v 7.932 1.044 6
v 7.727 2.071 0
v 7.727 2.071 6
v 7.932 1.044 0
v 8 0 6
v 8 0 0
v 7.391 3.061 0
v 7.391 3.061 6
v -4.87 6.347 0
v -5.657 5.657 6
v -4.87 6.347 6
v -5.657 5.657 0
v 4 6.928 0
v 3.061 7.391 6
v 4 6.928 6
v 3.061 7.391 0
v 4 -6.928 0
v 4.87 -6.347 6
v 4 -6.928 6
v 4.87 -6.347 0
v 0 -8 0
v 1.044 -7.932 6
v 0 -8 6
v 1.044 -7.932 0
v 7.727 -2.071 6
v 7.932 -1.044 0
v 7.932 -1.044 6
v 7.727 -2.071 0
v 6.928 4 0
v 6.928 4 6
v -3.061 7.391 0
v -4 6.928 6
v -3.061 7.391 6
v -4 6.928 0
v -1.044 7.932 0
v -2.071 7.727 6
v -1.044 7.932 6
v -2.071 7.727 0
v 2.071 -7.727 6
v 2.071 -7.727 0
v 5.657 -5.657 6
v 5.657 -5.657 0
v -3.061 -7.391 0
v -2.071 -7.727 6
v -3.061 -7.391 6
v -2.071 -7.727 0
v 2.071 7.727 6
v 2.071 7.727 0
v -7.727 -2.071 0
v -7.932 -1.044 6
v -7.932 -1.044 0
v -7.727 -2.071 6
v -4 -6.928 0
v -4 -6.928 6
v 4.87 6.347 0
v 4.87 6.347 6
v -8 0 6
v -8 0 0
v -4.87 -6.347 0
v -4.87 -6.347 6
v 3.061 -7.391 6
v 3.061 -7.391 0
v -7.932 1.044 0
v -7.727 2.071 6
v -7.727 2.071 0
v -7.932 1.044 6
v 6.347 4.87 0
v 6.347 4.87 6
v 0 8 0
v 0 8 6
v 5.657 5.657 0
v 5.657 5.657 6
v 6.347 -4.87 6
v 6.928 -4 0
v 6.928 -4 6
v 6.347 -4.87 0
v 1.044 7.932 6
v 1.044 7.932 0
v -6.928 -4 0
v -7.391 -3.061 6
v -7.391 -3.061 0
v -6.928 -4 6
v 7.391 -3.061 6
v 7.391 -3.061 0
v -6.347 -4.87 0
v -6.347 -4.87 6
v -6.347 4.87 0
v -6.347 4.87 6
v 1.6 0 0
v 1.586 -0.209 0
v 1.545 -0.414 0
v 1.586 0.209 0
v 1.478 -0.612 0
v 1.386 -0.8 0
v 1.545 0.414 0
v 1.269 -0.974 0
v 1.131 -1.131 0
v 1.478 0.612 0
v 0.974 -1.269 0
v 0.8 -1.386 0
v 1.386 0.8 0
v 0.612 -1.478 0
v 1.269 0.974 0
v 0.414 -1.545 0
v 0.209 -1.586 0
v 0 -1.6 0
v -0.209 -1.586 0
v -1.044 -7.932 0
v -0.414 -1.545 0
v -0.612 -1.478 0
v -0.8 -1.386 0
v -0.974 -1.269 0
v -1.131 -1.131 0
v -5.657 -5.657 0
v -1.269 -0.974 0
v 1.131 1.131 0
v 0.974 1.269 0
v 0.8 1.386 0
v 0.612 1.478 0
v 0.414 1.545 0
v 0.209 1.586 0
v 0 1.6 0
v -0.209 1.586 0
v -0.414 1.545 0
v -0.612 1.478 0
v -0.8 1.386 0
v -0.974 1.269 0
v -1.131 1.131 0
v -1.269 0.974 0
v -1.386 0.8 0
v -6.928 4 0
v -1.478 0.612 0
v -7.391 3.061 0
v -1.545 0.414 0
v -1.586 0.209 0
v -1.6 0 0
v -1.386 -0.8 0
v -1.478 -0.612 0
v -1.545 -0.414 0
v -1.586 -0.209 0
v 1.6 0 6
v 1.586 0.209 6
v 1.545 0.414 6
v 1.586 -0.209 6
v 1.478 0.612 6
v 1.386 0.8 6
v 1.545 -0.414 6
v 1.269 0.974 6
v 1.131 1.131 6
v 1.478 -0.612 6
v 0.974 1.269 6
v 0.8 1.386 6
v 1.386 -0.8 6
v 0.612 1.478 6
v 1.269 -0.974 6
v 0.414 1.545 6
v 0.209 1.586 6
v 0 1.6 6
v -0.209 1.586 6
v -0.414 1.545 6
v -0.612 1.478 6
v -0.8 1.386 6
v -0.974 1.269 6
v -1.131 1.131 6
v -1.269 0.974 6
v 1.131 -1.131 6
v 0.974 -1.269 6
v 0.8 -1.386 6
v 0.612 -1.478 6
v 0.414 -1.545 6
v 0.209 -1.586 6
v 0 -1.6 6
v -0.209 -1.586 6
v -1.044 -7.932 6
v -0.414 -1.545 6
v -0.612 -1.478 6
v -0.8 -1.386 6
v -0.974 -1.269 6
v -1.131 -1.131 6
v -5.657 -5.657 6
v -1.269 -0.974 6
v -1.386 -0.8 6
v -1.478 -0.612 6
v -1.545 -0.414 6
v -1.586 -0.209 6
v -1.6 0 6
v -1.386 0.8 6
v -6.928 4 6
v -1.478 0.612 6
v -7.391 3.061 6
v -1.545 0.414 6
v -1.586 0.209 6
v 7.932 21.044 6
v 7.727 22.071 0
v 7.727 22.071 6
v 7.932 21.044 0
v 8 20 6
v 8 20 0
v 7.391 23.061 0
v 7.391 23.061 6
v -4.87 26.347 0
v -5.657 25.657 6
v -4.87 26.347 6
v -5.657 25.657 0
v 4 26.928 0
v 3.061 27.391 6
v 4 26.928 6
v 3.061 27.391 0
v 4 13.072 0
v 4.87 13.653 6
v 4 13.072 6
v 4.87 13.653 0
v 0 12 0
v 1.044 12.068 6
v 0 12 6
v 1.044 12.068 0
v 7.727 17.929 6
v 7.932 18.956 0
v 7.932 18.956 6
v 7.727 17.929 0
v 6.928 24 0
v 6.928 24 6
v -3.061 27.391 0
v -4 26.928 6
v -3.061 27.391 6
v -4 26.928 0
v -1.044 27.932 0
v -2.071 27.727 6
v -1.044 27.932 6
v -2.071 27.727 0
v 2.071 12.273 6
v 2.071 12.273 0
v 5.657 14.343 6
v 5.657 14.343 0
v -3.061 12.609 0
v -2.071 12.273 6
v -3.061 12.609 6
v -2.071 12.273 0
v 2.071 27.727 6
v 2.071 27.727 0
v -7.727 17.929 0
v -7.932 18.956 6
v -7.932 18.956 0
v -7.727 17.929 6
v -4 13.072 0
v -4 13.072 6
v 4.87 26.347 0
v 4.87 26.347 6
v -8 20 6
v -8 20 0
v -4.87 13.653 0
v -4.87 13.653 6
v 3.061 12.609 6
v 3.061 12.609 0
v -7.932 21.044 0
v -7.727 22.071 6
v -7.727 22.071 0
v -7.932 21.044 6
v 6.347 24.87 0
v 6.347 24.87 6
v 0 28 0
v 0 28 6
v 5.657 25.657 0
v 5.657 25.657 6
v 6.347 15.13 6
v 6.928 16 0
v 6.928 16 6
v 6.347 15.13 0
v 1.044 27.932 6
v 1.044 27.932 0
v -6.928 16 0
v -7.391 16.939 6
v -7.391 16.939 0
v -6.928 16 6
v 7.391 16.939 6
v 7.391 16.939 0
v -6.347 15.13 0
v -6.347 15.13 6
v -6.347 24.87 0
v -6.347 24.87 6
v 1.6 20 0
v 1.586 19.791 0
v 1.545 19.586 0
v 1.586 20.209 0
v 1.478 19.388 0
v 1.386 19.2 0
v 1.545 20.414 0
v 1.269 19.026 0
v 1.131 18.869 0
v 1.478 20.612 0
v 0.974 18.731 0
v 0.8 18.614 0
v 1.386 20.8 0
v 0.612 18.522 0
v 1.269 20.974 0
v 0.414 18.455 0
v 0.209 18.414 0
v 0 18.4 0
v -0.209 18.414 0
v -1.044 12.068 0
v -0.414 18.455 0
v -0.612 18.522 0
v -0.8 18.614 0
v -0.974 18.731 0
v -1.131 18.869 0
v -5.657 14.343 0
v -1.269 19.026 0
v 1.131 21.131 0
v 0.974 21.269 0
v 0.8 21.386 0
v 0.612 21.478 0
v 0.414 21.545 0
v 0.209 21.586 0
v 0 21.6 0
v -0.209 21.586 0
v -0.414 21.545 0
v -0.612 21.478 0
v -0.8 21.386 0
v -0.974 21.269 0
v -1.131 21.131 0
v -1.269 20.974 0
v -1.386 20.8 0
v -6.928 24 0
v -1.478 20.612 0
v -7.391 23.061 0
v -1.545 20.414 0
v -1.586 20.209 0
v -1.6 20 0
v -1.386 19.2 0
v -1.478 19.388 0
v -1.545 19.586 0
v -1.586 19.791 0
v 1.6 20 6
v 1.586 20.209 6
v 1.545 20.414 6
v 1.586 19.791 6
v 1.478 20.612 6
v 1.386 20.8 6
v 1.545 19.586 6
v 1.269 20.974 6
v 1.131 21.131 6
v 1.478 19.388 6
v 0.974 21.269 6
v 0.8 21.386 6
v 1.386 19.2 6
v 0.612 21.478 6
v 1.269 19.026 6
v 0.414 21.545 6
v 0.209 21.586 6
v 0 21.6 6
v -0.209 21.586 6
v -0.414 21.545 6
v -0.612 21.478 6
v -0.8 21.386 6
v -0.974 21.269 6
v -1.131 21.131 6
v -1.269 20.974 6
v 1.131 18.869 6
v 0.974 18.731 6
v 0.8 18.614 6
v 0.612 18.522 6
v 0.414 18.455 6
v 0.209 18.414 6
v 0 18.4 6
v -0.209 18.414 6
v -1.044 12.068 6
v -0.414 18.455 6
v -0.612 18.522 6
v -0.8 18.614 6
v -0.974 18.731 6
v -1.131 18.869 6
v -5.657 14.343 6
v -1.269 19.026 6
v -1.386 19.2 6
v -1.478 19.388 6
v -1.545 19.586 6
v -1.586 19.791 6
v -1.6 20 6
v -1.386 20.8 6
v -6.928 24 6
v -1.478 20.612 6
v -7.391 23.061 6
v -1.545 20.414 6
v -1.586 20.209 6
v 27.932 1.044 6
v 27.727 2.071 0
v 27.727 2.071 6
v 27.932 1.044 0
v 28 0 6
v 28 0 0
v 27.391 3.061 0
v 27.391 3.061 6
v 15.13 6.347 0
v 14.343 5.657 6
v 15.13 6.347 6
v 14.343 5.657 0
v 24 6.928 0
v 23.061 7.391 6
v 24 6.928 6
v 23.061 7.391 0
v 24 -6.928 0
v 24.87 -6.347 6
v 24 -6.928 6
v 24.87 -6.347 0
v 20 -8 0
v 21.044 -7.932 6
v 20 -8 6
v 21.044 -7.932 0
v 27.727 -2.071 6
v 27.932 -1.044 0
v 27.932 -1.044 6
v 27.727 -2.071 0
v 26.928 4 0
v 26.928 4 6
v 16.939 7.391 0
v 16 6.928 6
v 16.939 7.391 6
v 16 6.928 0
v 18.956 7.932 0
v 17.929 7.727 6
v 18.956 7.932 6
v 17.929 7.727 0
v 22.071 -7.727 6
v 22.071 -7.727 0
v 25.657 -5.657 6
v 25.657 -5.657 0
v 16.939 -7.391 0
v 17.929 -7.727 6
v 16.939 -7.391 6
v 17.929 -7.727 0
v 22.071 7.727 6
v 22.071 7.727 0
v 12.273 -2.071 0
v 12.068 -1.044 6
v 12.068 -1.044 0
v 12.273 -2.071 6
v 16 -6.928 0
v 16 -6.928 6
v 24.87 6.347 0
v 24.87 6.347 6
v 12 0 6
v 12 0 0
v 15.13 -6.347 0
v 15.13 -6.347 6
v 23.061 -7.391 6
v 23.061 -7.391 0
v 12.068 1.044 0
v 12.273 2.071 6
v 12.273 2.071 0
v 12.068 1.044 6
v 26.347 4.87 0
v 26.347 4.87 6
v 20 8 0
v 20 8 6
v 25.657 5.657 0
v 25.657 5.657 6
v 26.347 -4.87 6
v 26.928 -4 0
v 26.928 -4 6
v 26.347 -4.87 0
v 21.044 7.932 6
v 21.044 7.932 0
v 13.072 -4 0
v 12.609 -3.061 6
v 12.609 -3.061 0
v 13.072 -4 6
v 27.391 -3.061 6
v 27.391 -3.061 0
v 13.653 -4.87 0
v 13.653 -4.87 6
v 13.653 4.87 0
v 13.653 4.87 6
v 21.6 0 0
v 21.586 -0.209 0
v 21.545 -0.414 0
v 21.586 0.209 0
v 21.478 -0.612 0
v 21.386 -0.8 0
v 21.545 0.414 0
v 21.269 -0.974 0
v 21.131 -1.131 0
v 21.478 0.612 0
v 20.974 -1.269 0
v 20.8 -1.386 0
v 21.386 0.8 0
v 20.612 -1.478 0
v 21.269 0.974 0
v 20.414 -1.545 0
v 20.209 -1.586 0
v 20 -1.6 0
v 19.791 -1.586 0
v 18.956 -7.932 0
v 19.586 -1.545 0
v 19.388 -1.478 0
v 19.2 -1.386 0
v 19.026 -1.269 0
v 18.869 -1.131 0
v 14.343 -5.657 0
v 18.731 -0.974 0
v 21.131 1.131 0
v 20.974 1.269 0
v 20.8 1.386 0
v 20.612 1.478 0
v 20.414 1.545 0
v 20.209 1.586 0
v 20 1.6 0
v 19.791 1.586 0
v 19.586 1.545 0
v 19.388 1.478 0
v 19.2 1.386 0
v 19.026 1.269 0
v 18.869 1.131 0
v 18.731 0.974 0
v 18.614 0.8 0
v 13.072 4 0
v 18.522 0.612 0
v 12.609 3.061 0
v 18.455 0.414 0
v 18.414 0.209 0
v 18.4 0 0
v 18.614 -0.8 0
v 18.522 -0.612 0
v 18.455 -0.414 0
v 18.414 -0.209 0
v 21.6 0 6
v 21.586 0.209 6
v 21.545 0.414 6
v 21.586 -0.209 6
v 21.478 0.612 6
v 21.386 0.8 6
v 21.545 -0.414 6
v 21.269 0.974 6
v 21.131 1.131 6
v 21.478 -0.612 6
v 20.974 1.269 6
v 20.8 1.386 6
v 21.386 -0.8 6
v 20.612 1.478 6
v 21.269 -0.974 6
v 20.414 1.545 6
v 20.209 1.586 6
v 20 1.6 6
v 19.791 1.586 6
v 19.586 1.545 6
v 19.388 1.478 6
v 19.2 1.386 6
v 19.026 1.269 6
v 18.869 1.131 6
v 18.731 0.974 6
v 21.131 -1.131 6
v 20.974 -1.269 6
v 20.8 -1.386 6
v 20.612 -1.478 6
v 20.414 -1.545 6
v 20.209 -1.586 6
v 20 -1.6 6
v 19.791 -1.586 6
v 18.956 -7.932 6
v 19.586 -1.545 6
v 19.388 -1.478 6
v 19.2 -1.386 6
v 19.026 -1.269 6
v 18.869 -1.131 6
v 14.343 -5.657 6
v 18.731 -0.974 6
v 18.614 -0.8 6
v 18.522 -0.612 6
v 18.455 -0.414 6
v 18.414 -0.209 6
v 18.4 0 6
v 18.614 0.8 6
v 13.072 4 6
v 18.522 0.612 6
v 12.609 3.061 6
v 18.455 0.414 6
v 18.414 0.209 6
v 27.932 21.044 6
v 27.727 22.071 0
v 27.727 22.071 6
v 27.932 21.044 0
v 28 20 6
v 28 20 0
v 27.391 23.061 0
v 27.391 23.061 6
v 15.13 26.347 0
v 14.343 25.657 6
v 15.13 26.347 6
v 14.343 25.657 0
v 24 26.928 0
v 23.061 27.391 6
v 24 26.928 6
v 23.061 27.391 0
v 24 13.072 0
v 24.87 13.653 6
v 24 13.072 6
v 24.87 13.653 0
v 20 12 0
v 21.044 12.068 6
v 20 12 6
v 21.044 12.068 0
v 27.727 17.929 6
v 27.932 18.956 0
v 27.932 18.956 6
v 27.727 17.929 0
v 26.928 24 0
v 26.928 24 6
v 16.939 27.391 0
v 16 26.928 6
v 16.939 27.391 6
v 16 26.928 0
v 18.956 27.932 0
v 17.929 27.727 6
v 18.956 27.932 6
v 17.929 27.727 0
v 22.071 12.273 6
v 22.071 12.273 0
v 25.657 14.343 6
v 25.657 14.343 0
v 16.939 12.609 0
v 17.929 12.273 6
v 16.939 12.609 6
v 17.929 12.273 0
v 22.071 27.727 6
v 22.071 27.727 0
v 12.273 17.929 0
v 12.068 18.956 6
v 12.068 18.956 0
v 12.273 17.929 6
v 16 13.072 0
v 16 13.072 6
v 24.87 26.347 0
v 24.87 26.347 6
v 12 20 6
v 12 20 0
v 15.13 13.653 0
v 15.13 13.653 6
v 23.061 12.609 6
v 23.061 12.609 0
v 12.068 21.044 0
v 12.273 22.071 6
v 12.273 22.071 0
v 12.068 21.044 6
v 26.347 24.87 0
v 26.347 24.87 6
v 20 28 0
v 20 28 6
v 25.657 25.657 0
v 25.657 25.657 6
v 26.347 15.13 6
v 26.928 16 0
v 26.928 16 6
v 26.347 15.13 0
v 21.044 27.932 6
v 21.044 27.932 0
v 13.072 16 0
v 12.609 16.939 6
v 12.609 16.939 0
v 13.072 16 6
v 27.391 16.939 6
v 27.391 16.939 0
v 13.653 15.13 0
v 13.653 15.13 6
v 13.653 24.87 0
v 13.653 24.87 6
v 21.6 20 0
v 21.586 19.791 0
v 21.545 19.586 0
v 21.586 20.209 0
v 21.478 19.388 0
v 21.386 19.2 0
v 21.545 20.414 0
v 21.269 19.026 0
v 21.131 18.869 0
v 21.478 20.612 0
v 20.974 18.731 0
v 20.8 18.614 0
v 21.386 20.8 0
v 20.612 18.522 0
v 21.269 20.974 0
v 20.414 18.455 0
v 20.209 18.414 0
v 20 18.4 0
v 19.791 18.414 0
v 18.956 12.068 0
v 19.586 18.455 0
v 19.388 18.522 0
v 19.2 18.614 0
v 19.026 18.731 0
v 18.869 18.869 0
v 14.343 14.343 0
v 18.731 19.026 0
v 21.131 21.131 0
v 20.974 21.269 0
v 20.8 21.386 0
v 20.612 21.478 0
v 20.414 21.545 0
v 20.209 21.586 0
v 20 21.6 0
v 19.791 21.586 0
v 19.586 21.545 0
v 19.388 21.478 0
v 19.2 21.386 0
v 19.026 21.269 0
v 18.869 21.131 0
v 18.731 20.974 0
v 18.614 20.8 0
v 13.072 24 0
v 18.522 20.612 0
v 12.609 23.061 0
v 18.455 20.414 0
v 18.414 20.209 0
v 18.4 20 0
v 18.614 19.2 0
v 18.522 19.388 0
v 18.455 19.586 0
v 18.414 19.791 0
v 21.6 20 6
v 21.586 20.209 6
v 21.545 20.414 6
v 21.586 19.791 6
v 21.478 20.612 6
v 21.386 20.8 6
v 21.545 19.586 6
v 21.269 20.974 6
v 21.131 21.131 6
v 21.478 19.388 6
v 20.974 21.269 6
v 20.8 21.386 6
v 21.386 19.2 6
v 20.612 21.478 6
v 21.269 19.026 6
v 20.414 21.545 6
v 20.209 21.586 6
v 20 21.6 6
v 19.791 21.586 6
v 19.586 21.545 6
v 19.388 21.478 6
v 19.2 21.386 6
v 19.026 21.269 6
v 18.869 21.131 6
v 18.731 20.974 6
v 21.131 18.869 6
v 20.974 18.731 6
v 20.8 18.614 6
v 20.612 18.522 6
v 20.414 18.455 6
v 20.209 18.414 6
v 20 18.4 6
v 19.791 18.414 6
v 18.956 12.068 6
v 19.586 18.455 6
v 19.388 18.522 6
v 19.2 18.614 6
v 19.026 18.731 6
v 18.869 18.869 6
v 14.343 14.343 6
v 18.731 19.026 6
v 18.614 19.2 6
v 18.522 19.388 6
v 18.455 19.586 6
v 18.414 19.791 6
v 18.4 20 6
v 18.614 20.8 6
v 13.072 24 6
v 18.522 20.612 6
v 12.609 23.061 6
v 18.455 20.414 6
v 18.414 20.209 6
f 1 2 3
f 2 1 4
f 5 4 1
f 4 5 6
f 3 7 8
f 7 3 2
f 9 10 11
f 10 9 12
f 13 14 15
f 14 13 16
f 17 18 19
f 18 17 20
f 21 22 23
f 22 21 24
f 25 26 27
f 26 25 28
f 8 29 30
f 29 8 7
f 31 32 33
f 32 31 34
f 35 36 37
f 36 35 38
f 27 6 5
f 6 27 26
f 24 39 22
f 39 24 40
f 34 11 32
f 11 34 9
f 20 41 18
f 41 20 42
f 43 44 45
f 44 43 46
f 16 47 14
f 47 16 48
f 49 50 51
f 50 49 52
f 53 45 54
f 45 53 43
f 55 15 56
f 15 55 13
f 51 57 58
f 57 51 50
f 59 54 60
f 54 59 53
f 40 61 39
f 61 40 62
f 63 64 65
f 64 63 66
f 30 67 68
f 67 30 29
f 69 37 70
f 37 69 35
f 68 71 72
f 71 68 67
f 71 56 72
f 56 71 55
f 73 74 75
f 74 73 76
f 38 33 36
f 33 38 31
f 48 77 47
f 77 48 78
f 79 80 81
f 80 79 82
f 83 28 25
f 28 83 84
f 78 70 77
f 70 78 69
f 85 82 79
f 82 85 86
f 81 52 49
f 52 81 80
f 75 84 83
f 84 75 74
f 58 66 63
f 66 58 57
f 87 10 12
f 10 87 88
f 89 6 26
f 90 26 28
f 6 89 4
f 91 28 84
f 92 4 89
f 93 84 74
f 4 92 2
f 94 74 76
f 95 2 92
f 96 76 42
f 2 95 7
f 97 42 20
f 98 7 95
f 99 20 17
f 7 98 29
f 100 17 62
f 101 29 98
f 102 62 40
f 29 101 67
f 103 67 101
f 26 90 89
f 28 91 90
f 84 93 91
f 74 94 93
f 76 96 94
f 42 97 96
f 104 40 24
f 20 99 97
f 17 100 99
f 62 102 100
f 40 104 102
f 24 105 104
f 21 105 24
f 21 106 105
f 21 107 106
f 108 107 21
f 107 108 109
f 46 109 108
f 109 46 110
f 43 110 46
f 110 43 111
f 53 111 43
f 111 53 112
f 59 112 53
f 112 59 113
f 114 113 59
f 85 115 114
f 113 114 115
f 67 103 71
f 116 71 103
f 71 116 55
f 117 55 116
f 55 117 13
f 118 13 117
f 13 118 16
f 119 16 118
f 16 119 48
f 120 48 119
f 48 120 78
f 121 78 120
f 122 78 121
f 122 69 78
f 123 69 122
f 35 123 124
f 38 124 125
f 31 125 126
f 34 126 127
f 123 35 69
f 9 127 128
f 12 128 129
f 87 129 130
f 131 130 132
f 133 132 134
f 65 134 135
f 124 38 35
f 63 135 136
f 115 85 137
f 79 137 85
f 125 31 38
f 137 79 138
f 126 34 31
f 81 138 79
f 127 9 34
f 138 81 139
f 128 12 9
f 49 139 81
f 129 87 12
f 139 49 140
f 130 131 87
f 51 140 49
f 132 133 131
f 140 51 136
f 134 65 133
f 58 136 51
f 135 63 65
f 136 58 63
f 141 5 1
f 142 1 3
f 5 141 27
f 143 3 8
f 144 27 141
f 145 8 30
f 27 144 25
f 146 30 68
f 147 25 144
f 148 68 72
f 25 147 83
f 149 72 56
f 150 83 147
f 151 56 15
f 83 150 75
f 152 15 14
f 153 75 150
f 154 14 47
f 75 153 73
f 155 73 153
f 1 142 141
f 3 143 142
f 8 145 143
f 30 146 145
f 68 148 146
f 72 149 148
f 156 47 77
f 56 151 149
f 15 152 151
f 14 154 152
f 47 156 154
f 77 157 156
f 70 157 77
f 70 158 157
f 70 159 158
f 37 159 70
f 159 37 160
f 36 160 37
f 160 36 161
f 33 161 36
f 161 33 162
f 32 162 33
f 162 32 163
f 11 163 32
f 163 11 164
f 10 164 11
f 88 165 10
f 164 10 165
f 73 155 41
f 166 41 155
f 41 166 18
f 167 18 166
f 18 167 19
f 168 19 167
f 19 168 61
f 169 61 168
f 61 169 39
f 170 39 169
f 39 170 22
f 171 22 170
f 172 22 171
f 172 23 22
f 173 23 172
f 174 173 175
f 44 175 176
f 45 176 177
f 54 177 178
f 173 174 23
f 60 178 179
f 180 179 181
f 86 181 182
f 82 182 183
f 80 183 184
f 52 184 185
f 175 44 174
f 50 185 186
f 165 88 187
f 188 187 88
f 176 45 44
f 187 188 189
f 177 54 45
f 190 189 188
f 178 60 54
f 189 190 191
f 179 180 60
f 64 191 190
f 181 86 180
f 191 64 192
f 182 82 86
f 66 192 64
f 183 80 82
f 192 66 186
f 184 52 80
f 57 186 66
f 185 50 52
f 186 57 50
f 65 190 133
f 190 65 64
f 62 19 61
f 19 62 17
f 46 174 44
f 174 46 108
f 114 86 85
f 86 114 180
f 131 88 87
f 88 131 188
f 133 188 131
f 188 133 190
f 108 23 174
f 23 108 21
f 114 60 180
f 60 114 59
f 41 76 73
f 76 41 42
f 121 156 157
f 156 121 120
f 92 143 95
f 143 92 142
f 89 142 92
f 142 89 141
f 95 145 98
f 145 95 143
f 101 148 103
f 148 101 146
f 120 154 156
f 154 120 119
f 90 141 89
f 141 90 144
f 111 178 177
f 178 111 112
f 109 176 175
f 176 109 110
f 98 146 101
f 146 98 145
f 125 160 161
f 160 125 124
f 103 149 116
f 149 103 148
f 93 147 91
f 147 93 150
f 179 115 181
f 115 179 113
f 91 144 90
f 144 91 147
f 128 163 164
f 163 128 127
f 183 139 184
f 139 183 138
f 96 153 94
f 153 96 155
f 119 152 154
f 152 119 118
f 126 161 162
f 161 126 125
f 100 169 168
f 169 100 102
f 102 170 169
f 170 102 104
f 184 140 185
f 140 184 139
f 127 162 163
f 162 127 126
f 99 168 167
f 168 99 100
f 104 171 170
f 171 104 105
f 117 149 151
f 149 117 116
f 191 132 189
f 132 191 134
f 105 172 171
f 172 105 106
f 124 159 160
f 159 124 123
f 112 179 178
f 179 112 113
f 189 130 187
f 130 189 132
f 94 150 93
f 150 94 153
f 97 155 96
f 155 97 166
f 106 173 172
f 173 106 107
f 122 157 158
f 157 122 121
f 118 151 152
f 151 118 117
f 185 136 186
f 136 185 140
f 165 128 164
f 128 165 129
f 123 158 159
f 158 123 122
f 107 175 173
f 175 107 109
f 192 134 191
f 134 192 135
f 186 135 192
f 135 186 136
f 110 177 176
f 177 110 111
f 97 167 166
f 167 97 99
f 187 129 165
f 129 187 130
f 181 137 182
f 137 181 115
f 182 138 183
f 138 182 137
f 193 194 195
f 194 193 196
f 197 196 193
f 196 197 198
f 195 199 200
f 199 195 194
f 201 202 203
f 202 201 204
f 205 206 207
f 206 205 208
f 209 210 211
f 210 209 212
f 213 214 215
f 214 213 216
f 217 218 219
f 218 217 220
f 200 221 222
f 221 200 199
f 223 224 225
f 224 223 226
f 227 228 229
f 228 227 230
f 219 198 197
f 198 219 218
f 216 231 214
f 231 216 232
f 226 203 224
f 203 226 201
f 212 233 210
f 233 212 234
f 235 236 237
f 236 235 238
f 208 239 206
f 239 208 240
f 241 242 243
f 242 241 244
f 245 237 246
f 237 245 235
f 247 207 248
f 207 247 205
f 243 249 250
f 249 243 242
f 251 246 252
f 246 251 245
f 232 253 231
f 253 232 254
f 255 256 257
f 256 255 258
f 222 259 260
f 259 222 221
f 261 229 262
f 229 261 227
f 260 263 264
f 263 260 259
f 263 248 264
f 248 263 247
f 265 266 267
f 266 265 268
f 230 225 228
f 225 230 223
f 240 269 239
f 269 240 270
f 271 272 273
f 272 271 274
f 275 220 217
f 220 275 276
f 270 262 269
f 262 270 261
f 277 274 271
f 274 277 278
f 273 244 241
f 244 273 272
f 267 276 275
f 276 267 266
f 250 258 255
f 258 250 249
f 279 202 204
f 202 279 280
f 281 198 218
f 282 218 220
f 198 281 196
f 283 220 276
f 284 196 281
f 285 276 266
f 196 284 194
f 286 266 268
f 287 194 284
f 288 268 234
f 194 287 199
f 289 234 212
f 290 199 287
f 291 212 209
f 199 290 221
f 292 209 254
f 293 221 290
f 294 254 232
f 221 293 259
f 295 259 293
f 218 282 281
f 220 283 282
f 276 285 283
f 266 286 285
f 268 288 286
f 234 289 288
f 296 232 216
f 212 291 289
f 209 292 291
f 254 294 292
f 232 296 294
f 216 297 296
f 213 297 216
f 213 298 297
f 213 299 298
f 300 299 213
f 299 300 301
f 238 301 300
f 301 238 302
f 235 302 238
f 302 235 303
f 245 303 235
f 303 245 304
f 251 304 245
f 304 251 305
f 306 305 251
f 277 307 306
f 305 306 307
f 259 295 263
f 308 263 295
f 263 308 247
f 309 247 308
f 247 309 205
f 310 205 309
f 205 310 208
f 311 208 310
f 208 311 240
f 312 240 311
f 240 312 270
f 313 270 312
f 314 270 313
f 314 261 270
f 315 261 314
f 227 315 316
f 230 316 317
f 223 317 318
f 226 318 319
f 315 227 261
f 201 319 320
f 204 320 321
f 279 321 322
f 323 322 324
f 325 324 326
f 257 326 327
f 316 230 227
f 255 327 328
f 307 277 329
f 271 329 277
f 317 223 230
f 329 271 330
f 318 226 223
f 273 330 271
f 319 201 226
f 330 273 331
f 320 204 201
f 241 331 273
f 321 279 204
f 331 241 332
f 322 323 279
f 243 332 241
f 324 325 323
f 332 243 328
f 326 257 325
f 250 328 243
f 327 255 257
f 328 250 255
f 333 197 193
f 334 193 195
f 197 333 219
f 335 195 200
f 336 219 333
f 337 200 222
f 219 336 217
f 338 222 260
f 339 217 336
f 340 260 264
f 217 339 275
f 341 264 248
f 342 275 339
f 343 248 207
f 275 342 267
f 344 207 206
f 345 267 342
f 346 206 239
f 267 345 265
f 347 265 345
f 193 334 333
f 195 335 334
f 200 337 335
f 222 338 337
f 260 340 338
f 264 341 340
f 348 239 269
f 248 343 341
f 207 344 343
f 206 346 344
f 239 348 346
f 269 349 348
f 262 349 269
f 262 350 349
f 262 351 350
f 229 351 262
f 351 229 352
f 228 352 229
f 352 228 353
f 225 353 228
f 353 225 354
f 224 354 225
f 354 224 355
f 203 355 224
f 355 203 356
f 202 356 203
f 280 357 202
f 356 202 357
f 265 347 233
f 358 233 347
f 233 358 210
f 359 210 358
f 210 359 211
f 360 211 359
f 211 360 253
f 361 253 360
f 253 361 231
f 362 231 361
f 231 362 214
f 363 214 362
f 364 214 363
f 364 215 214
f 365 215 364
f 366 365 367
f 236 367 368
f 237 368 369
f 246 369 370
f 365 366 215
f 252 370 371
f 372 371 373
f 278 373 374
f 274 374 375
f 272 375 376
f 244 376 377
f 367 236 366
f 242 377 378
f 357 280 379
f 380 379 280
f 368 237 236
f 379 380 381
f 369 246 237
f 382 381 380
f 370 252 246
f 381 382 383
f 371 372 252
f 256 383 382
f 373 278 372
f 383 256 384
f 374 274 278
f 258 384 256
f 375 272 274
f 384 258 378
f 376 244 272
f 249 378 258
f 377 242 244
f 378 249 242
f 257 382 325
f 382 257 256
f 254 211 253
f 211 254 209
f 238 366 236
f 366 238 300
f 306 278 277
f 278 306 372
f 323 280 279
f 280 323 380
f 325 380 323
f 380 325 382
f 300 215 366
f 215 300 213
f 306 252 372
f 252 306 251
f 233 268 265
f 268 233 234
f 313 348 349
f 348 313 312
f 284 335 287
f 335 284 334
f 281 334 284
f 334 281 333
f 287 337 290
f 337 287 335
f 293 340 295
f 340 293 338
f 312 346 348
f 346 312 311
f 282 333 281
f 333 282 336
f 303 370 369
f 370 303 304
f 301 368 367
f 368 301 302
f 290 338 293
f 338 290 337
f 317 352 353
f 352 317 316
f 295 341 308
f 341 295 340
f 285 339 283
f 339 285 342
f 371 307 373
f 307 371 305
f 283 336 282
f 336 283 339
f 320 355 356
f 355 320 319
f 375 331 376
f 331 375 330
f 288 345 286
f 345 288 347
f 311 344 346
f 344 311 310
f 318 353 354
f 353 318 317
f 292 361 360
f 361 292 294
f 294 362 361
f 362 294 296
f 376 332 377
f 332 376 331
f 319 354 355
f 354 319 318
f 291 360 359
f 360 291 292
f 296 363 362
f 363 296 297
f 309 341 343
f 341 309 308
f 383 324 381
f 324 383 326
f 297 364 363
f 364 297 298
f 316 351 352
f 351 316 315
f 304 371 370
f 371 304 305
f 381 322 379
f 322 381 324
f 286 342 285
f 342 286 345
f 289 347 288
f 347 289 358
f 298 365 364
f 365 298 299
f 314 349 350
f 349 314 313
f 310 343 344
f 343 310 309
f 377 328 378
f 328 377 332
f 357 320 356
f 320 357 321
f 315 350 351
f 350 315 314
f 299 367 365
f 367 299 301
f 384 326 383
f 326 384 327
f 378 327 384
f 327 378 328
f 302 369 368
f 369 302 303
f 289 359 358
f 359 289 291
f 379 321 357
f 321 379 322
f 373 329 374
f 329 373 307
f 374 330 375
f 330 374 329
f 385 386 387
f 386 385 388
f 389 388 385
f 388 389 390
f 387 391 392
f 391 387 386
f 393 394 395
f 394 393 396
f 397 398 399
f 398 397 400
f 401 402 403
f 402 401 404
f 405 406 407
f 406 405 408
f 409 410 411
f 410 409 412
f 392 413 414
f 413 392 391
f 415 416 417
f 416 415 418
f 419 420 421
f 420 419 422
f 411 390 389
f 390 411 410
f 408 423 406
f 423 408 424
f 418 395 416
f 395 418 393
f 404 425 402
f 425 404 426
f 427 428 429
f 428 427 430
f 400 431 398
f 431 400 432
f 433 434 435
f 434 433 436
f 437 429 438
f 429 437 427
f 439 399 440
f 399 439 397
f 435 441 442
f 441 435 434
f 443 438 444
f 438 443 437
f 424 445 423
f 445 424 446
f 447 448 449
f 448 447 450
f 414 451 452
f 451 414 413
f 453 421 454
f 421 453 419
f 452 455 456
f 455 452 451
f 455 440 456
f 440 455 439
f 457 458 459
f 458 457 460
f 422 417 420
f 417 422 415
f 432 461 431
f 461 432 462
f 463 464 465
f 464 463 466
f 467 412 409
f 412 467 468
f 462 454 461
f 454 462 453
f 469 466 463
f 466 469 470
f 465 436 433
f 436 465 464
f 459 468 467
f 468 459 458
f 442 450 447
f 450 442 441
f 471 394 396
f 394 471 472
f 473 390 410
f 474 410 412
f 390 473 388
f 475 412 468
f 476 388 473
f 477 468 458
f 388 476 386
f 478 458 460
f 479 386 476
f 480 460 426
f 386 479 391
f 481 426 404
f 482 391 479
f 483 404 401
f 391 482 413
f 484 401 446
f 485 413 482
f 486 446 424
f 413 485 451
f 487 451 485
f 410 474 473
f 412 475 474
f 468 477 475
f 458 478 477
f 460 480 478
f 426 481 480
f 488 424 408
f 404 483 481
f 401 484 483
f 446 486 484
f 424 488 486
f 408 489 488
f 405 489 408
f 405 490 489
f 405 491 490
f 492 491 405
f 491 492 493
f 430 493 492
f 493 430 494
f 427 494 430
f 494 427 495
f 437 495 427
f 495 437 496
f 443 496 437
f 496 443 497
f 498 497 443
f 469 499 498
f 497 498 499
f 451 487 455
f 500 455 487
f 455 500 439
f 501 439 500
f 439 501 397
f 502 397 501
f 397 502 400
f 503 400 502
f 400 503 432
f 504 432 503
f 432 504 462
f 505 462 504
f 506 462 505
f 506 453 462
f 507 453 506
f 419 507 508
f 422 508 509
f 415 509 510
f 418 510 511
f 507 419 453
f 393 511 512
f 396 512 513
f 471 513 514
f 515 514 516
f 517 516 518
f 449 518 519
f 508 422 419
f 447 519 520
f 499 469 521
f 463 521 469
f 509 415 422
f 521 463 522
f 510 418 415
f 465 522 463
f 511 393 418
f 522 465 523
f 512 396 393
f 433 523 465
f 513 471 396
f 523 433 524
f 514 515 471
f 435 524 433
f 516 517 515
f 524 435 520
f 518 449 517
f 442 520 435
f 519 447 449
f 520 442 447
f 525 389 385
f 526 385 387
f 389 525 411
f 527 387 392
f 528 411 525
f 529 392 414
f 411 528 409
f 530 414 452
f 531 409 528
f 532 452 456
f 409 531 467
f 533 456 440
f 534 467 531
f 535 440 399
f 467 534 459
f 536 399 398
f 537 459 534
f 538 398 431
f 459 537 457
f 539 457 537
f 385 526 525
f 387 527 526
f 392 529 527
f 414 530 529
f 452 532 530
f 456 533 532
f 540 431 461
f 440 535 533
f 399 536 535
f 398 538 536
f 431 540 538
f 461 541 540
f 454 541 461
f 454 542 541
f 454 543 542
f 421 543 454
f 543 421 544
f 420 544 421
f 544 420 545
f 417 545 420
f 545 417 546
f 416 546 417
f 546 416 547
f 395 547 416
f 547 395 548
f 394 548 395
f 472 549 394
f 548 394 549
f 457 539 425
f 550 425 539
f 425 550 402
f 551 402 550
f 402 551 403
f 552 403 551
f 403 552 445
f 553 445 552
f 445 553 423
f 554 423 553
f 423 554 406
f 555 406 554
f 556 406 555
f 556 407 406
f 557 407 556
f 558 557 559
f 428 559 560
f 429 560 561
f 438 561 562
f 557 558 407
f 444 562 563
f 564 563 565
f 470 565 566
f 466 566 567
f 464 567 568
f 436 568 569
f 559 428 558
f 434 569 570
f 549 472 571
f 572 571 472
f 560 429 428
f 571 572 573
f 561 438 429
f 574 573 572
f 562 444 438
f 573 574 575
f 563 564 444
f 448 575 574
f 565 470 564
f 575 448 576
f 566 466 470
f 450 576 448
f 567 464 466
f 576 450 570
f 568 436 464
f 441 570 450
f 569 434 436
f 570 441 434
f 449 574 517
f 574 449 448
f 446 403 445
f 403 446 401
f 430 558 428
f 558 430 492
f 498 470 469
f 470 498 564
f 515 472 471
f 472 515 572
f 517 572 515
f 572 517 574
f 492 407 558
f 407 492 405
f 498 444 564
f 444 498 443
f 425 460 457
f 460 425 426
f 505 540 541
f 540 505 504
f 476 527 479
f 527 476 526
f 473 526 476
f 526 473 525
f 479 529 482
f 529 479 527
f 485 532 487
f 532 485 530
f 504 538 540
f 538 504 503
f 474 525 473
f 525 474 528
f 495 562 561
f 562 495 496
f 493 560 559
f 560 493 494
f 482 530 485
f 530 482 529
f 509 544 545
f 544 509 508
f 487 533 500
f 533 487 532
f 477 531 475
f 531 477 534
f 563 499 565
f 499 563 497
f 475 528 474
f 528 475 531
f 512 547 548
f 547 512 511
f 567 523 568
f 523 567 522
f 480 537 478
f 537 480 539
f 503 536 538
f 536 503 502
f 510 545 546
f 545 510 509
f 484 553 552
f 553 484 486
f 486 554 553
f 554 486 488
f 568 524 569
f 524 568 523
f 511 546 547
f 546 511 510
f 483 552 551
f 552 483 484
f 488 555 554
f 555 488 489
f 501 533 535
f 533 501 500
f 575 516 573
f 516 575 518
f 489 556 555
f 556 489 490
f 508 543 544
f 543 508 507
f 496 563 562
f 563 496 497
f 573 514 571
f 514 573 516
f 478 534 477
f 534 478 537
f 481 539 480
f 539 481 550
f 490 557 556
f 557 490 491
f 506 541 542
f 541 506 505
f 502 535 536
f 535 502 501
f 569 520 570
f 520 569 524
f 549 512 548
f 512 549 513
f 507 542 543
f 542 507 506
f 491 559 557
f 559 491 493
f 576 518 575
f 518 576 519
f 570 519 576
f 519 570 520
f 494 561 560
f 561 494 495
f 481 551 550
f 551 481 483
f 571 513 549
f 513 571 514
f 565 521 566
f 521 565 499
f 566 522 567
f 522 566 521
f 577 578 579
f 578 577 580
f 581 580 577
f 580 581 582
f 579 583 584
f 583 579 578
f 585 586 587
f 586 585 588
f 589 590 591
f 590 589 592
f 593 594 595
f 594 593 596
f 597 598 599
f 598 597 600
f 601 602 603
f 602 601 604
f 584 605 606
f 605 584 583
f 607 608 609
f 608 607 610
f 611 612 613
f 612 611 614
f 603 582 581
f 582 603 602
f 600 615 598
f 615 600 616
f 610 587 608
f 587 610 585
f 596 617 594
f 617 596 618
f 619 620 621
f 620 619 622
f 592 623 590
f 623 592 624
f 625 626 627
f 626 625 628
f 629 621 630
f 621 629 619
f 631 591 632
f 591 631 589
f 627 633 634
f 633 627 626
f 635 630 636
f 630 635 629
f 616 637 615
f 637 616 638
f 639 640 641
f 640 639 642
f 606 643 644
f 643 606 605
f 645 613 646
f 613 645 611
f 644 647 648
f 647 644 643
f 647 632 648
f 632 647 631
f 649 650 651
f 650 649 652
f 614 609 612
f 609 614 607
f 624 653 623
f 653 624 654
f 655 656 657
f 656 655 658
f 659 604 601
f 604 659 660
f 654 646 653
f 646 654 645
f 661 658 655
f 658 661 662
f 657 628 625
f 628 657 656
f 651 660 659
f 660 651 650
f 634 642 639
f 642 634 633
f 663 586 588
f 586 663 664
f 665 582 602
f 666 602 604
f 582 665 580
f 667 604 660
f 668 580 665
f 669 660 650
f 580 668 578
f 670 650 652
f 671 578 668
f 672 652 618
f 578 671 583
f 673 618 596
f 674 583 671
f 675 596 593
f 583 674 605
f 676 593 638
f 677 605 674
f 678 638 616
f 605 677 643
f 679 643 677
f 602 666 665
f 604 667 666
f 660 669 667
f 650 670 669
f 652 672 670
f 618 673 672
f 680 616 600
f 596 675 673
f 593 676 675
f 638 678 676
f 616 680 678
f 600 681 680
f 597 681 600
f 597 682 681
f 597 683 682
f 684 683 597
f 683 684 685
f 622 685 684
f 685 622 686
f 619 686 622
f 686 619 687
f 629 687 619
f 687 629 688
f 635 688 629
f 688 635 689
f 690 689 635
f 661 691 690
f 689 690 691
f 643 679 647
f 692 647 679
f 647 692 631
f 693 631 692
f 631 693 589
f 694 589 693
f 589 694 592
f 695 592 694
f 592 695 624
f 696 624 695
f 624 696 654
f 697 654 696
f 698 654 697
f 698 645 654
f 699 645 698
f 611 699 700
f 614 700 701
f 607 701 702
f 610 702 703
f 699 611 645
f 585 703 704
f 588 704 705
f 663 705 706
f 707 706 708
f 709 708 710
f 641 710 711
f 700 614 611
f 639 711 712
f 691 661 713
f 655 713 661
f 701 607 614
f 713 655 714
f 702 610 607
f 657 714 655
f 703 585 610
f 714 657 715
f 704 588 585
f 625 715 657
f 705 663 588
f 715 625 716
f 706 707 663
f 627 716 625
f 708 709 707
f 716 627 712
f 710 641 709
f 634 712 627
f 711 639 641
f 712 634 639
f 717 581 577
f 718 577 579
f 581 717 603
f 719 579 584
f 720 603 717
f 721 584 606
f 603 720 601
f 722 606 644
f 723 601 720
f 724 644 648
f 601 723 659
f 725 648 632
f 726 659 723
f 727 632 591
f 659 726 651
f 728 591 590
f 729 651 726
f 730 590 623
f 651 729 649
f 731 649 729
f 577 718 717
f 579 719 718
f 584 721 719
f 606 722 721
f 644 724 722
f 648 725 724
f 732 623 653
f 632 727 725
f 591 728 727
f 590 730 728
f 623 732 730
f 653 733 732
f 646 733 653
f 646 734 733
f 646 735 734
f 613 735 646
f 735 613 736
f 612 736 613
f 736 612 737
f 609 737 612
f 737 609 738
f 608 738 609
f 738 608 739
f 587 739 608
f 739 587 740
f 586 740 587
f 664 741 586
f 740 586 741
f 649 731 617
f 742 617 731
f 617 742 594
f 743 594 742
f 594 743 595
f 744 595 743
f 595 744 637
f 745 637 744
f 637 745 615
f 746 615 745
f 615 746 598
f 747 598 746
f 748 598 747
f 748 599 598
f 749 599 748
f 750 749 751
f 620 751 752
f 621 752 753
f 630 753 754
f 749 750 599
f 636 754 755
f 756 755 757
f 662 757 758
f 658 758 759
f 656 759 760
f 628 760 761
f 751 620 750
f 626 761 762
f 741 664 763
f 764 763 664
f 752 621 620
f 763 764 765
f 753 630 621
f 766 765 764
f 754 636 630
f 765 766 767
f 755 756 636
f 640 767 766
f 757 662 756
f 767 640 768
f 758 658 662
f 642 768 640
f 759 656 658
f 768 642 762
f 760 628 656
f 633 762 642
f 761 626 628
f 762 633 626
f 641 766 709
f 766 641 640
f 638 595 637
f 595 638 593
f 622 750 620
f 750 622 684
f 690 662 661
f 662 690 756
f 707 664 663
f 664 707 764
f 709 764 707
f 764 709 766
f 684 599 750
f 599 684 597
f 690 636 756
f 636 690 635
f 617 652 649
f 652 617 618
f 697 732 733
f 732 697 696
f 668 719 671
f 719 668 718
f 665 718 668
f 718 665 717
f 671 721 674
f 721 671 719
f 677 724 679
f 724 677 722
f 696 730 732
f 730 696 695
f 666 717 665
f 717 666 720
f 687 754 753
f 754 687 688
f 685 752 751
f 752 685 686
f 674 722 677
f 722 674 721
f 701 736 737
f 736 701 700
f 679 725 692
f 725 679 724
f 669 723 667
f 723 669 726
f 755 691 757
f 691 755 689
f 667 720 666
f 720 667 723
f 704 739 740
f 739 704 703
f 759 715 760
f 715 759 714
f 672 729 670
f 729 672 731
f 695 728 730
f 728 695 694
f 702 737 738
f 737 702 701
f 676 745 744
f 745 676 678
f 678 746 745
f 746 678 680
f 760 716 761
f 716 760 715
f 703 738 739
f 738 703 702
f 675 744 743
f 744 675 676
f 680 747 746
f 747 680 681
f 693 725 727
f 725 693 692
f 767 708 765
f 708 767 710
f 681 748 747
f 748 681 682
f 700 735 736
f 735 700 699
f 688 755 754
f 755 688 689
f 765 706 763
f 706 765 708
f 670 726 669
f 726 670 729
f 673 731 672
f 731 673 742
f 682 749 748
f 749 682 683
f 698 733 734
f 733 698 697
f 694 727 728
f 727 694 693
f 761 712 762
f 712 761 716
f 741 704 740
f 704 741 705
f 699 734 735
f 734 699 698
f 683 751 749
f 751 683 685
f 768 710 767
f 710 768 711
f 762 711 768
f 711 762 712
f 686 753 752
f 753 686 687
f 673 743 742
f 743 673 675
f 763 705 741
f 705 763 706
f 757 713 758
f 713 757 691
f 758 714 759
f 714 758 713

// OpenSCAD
// Retrofit FR4 standoffs for a box printed without floor pads.
// Print 4 spacers; drill the floor with the jig; M3 through-bolts.
// Same XY as fr4_bosses() in the enclosure files.

part = "standoffs"; // "standoffs" | "jig"

inner_x = 108;
inner_y = 85;
chamfer = 14;
corner_r = 8;
wall = 2.8;
boss_d = 12;

fr4_boss_d = 16;
fr4_boss_h = 6;
fr4_boss_y = 16;
fr4_tail_drop = 10;
m3_clear_d = 3.2;          // through-hole for M3×12 (floor + spacer + FR4)
jig_t = 1.2;

$fn = 48;

function boss_inset() = boss_d / 2 + 1.5;

function so239_boss_xy(sy) =
    let (
        inset = boss_inset(),
        cy = sy * (inner_y / 2 - inset),
        cx = inner_x / 2 + inner_y / 2 - chamfer
            - abs(cy) - inset * sqrt(2)
    ) [cx, cy];

function tail_boss_xy(sy) =
    [-inner_x / 2 + boss_inset(), sy * (inner_y / 2 - boss_inset())];

function fr4_pad_xy(sx, sy) = [
    sx > 0 ? so239_boss_xy(1)[0] : tail_boss_xy(1)[0] + fr4_tail_drop,
    sy * fr4_boss_y
];

module chamfered_profile() {
    inner_corner_r = max(0.1, corner_r - wall);
    offset(r = inner_corner_r)
        offset(delta = -inner_corner_r)
            polygon([
                [-inner_x / 2, -inner_y / 2],
                [ inner_x / 2 - chamfer, -inner_y / 2],
                [ inner_x / 2, -inner_y / 2 + chamfer],
                [ inner_x / 2,  inner_y / 2 - chamfer],
                [ inner_x / 2 - chamfer,  inner_y / 2],
                [-inner_x / 2,  inner_y / 2]
            ]);
}

module fr4_standoff() {
    difference() {
        cylinder(d = fr4_boss_d, h = fr4_boss_h);
        translate([0, 0, -0.1])
            cylinder(d = m3_clear_d, h = fr4_boss_h + 0.2);
    }
}

module standoffs_print() {
    pitch = fr4_boss_d + 4;
    for (i = [0:1], j = [0:1])
        translate([i * pitch, j * pitch, 0])
            fr4_standoff();
}

module drill_jig() {
    difference() {
        linear_extrude(height = jig_t)
            chamfered_profile();
        for (sx = [-1, 1], sy = [-1, 1]) {
            p = fr4_pad_xy(sx, sy);
            translate([p[0], p[1], -0.1])
                cylinder(d = m3_clear_d, h = jig_t + 0.2);
        }
        // Finger hole to lift the jig out of the cavity.
        cylinder(d = 18, h = jig_t + 0.2, center = true);
    }
}

if (part == "jig") {
    drill_jig();
} else if (part == "standoffs") {
    standoffs_print();
}
